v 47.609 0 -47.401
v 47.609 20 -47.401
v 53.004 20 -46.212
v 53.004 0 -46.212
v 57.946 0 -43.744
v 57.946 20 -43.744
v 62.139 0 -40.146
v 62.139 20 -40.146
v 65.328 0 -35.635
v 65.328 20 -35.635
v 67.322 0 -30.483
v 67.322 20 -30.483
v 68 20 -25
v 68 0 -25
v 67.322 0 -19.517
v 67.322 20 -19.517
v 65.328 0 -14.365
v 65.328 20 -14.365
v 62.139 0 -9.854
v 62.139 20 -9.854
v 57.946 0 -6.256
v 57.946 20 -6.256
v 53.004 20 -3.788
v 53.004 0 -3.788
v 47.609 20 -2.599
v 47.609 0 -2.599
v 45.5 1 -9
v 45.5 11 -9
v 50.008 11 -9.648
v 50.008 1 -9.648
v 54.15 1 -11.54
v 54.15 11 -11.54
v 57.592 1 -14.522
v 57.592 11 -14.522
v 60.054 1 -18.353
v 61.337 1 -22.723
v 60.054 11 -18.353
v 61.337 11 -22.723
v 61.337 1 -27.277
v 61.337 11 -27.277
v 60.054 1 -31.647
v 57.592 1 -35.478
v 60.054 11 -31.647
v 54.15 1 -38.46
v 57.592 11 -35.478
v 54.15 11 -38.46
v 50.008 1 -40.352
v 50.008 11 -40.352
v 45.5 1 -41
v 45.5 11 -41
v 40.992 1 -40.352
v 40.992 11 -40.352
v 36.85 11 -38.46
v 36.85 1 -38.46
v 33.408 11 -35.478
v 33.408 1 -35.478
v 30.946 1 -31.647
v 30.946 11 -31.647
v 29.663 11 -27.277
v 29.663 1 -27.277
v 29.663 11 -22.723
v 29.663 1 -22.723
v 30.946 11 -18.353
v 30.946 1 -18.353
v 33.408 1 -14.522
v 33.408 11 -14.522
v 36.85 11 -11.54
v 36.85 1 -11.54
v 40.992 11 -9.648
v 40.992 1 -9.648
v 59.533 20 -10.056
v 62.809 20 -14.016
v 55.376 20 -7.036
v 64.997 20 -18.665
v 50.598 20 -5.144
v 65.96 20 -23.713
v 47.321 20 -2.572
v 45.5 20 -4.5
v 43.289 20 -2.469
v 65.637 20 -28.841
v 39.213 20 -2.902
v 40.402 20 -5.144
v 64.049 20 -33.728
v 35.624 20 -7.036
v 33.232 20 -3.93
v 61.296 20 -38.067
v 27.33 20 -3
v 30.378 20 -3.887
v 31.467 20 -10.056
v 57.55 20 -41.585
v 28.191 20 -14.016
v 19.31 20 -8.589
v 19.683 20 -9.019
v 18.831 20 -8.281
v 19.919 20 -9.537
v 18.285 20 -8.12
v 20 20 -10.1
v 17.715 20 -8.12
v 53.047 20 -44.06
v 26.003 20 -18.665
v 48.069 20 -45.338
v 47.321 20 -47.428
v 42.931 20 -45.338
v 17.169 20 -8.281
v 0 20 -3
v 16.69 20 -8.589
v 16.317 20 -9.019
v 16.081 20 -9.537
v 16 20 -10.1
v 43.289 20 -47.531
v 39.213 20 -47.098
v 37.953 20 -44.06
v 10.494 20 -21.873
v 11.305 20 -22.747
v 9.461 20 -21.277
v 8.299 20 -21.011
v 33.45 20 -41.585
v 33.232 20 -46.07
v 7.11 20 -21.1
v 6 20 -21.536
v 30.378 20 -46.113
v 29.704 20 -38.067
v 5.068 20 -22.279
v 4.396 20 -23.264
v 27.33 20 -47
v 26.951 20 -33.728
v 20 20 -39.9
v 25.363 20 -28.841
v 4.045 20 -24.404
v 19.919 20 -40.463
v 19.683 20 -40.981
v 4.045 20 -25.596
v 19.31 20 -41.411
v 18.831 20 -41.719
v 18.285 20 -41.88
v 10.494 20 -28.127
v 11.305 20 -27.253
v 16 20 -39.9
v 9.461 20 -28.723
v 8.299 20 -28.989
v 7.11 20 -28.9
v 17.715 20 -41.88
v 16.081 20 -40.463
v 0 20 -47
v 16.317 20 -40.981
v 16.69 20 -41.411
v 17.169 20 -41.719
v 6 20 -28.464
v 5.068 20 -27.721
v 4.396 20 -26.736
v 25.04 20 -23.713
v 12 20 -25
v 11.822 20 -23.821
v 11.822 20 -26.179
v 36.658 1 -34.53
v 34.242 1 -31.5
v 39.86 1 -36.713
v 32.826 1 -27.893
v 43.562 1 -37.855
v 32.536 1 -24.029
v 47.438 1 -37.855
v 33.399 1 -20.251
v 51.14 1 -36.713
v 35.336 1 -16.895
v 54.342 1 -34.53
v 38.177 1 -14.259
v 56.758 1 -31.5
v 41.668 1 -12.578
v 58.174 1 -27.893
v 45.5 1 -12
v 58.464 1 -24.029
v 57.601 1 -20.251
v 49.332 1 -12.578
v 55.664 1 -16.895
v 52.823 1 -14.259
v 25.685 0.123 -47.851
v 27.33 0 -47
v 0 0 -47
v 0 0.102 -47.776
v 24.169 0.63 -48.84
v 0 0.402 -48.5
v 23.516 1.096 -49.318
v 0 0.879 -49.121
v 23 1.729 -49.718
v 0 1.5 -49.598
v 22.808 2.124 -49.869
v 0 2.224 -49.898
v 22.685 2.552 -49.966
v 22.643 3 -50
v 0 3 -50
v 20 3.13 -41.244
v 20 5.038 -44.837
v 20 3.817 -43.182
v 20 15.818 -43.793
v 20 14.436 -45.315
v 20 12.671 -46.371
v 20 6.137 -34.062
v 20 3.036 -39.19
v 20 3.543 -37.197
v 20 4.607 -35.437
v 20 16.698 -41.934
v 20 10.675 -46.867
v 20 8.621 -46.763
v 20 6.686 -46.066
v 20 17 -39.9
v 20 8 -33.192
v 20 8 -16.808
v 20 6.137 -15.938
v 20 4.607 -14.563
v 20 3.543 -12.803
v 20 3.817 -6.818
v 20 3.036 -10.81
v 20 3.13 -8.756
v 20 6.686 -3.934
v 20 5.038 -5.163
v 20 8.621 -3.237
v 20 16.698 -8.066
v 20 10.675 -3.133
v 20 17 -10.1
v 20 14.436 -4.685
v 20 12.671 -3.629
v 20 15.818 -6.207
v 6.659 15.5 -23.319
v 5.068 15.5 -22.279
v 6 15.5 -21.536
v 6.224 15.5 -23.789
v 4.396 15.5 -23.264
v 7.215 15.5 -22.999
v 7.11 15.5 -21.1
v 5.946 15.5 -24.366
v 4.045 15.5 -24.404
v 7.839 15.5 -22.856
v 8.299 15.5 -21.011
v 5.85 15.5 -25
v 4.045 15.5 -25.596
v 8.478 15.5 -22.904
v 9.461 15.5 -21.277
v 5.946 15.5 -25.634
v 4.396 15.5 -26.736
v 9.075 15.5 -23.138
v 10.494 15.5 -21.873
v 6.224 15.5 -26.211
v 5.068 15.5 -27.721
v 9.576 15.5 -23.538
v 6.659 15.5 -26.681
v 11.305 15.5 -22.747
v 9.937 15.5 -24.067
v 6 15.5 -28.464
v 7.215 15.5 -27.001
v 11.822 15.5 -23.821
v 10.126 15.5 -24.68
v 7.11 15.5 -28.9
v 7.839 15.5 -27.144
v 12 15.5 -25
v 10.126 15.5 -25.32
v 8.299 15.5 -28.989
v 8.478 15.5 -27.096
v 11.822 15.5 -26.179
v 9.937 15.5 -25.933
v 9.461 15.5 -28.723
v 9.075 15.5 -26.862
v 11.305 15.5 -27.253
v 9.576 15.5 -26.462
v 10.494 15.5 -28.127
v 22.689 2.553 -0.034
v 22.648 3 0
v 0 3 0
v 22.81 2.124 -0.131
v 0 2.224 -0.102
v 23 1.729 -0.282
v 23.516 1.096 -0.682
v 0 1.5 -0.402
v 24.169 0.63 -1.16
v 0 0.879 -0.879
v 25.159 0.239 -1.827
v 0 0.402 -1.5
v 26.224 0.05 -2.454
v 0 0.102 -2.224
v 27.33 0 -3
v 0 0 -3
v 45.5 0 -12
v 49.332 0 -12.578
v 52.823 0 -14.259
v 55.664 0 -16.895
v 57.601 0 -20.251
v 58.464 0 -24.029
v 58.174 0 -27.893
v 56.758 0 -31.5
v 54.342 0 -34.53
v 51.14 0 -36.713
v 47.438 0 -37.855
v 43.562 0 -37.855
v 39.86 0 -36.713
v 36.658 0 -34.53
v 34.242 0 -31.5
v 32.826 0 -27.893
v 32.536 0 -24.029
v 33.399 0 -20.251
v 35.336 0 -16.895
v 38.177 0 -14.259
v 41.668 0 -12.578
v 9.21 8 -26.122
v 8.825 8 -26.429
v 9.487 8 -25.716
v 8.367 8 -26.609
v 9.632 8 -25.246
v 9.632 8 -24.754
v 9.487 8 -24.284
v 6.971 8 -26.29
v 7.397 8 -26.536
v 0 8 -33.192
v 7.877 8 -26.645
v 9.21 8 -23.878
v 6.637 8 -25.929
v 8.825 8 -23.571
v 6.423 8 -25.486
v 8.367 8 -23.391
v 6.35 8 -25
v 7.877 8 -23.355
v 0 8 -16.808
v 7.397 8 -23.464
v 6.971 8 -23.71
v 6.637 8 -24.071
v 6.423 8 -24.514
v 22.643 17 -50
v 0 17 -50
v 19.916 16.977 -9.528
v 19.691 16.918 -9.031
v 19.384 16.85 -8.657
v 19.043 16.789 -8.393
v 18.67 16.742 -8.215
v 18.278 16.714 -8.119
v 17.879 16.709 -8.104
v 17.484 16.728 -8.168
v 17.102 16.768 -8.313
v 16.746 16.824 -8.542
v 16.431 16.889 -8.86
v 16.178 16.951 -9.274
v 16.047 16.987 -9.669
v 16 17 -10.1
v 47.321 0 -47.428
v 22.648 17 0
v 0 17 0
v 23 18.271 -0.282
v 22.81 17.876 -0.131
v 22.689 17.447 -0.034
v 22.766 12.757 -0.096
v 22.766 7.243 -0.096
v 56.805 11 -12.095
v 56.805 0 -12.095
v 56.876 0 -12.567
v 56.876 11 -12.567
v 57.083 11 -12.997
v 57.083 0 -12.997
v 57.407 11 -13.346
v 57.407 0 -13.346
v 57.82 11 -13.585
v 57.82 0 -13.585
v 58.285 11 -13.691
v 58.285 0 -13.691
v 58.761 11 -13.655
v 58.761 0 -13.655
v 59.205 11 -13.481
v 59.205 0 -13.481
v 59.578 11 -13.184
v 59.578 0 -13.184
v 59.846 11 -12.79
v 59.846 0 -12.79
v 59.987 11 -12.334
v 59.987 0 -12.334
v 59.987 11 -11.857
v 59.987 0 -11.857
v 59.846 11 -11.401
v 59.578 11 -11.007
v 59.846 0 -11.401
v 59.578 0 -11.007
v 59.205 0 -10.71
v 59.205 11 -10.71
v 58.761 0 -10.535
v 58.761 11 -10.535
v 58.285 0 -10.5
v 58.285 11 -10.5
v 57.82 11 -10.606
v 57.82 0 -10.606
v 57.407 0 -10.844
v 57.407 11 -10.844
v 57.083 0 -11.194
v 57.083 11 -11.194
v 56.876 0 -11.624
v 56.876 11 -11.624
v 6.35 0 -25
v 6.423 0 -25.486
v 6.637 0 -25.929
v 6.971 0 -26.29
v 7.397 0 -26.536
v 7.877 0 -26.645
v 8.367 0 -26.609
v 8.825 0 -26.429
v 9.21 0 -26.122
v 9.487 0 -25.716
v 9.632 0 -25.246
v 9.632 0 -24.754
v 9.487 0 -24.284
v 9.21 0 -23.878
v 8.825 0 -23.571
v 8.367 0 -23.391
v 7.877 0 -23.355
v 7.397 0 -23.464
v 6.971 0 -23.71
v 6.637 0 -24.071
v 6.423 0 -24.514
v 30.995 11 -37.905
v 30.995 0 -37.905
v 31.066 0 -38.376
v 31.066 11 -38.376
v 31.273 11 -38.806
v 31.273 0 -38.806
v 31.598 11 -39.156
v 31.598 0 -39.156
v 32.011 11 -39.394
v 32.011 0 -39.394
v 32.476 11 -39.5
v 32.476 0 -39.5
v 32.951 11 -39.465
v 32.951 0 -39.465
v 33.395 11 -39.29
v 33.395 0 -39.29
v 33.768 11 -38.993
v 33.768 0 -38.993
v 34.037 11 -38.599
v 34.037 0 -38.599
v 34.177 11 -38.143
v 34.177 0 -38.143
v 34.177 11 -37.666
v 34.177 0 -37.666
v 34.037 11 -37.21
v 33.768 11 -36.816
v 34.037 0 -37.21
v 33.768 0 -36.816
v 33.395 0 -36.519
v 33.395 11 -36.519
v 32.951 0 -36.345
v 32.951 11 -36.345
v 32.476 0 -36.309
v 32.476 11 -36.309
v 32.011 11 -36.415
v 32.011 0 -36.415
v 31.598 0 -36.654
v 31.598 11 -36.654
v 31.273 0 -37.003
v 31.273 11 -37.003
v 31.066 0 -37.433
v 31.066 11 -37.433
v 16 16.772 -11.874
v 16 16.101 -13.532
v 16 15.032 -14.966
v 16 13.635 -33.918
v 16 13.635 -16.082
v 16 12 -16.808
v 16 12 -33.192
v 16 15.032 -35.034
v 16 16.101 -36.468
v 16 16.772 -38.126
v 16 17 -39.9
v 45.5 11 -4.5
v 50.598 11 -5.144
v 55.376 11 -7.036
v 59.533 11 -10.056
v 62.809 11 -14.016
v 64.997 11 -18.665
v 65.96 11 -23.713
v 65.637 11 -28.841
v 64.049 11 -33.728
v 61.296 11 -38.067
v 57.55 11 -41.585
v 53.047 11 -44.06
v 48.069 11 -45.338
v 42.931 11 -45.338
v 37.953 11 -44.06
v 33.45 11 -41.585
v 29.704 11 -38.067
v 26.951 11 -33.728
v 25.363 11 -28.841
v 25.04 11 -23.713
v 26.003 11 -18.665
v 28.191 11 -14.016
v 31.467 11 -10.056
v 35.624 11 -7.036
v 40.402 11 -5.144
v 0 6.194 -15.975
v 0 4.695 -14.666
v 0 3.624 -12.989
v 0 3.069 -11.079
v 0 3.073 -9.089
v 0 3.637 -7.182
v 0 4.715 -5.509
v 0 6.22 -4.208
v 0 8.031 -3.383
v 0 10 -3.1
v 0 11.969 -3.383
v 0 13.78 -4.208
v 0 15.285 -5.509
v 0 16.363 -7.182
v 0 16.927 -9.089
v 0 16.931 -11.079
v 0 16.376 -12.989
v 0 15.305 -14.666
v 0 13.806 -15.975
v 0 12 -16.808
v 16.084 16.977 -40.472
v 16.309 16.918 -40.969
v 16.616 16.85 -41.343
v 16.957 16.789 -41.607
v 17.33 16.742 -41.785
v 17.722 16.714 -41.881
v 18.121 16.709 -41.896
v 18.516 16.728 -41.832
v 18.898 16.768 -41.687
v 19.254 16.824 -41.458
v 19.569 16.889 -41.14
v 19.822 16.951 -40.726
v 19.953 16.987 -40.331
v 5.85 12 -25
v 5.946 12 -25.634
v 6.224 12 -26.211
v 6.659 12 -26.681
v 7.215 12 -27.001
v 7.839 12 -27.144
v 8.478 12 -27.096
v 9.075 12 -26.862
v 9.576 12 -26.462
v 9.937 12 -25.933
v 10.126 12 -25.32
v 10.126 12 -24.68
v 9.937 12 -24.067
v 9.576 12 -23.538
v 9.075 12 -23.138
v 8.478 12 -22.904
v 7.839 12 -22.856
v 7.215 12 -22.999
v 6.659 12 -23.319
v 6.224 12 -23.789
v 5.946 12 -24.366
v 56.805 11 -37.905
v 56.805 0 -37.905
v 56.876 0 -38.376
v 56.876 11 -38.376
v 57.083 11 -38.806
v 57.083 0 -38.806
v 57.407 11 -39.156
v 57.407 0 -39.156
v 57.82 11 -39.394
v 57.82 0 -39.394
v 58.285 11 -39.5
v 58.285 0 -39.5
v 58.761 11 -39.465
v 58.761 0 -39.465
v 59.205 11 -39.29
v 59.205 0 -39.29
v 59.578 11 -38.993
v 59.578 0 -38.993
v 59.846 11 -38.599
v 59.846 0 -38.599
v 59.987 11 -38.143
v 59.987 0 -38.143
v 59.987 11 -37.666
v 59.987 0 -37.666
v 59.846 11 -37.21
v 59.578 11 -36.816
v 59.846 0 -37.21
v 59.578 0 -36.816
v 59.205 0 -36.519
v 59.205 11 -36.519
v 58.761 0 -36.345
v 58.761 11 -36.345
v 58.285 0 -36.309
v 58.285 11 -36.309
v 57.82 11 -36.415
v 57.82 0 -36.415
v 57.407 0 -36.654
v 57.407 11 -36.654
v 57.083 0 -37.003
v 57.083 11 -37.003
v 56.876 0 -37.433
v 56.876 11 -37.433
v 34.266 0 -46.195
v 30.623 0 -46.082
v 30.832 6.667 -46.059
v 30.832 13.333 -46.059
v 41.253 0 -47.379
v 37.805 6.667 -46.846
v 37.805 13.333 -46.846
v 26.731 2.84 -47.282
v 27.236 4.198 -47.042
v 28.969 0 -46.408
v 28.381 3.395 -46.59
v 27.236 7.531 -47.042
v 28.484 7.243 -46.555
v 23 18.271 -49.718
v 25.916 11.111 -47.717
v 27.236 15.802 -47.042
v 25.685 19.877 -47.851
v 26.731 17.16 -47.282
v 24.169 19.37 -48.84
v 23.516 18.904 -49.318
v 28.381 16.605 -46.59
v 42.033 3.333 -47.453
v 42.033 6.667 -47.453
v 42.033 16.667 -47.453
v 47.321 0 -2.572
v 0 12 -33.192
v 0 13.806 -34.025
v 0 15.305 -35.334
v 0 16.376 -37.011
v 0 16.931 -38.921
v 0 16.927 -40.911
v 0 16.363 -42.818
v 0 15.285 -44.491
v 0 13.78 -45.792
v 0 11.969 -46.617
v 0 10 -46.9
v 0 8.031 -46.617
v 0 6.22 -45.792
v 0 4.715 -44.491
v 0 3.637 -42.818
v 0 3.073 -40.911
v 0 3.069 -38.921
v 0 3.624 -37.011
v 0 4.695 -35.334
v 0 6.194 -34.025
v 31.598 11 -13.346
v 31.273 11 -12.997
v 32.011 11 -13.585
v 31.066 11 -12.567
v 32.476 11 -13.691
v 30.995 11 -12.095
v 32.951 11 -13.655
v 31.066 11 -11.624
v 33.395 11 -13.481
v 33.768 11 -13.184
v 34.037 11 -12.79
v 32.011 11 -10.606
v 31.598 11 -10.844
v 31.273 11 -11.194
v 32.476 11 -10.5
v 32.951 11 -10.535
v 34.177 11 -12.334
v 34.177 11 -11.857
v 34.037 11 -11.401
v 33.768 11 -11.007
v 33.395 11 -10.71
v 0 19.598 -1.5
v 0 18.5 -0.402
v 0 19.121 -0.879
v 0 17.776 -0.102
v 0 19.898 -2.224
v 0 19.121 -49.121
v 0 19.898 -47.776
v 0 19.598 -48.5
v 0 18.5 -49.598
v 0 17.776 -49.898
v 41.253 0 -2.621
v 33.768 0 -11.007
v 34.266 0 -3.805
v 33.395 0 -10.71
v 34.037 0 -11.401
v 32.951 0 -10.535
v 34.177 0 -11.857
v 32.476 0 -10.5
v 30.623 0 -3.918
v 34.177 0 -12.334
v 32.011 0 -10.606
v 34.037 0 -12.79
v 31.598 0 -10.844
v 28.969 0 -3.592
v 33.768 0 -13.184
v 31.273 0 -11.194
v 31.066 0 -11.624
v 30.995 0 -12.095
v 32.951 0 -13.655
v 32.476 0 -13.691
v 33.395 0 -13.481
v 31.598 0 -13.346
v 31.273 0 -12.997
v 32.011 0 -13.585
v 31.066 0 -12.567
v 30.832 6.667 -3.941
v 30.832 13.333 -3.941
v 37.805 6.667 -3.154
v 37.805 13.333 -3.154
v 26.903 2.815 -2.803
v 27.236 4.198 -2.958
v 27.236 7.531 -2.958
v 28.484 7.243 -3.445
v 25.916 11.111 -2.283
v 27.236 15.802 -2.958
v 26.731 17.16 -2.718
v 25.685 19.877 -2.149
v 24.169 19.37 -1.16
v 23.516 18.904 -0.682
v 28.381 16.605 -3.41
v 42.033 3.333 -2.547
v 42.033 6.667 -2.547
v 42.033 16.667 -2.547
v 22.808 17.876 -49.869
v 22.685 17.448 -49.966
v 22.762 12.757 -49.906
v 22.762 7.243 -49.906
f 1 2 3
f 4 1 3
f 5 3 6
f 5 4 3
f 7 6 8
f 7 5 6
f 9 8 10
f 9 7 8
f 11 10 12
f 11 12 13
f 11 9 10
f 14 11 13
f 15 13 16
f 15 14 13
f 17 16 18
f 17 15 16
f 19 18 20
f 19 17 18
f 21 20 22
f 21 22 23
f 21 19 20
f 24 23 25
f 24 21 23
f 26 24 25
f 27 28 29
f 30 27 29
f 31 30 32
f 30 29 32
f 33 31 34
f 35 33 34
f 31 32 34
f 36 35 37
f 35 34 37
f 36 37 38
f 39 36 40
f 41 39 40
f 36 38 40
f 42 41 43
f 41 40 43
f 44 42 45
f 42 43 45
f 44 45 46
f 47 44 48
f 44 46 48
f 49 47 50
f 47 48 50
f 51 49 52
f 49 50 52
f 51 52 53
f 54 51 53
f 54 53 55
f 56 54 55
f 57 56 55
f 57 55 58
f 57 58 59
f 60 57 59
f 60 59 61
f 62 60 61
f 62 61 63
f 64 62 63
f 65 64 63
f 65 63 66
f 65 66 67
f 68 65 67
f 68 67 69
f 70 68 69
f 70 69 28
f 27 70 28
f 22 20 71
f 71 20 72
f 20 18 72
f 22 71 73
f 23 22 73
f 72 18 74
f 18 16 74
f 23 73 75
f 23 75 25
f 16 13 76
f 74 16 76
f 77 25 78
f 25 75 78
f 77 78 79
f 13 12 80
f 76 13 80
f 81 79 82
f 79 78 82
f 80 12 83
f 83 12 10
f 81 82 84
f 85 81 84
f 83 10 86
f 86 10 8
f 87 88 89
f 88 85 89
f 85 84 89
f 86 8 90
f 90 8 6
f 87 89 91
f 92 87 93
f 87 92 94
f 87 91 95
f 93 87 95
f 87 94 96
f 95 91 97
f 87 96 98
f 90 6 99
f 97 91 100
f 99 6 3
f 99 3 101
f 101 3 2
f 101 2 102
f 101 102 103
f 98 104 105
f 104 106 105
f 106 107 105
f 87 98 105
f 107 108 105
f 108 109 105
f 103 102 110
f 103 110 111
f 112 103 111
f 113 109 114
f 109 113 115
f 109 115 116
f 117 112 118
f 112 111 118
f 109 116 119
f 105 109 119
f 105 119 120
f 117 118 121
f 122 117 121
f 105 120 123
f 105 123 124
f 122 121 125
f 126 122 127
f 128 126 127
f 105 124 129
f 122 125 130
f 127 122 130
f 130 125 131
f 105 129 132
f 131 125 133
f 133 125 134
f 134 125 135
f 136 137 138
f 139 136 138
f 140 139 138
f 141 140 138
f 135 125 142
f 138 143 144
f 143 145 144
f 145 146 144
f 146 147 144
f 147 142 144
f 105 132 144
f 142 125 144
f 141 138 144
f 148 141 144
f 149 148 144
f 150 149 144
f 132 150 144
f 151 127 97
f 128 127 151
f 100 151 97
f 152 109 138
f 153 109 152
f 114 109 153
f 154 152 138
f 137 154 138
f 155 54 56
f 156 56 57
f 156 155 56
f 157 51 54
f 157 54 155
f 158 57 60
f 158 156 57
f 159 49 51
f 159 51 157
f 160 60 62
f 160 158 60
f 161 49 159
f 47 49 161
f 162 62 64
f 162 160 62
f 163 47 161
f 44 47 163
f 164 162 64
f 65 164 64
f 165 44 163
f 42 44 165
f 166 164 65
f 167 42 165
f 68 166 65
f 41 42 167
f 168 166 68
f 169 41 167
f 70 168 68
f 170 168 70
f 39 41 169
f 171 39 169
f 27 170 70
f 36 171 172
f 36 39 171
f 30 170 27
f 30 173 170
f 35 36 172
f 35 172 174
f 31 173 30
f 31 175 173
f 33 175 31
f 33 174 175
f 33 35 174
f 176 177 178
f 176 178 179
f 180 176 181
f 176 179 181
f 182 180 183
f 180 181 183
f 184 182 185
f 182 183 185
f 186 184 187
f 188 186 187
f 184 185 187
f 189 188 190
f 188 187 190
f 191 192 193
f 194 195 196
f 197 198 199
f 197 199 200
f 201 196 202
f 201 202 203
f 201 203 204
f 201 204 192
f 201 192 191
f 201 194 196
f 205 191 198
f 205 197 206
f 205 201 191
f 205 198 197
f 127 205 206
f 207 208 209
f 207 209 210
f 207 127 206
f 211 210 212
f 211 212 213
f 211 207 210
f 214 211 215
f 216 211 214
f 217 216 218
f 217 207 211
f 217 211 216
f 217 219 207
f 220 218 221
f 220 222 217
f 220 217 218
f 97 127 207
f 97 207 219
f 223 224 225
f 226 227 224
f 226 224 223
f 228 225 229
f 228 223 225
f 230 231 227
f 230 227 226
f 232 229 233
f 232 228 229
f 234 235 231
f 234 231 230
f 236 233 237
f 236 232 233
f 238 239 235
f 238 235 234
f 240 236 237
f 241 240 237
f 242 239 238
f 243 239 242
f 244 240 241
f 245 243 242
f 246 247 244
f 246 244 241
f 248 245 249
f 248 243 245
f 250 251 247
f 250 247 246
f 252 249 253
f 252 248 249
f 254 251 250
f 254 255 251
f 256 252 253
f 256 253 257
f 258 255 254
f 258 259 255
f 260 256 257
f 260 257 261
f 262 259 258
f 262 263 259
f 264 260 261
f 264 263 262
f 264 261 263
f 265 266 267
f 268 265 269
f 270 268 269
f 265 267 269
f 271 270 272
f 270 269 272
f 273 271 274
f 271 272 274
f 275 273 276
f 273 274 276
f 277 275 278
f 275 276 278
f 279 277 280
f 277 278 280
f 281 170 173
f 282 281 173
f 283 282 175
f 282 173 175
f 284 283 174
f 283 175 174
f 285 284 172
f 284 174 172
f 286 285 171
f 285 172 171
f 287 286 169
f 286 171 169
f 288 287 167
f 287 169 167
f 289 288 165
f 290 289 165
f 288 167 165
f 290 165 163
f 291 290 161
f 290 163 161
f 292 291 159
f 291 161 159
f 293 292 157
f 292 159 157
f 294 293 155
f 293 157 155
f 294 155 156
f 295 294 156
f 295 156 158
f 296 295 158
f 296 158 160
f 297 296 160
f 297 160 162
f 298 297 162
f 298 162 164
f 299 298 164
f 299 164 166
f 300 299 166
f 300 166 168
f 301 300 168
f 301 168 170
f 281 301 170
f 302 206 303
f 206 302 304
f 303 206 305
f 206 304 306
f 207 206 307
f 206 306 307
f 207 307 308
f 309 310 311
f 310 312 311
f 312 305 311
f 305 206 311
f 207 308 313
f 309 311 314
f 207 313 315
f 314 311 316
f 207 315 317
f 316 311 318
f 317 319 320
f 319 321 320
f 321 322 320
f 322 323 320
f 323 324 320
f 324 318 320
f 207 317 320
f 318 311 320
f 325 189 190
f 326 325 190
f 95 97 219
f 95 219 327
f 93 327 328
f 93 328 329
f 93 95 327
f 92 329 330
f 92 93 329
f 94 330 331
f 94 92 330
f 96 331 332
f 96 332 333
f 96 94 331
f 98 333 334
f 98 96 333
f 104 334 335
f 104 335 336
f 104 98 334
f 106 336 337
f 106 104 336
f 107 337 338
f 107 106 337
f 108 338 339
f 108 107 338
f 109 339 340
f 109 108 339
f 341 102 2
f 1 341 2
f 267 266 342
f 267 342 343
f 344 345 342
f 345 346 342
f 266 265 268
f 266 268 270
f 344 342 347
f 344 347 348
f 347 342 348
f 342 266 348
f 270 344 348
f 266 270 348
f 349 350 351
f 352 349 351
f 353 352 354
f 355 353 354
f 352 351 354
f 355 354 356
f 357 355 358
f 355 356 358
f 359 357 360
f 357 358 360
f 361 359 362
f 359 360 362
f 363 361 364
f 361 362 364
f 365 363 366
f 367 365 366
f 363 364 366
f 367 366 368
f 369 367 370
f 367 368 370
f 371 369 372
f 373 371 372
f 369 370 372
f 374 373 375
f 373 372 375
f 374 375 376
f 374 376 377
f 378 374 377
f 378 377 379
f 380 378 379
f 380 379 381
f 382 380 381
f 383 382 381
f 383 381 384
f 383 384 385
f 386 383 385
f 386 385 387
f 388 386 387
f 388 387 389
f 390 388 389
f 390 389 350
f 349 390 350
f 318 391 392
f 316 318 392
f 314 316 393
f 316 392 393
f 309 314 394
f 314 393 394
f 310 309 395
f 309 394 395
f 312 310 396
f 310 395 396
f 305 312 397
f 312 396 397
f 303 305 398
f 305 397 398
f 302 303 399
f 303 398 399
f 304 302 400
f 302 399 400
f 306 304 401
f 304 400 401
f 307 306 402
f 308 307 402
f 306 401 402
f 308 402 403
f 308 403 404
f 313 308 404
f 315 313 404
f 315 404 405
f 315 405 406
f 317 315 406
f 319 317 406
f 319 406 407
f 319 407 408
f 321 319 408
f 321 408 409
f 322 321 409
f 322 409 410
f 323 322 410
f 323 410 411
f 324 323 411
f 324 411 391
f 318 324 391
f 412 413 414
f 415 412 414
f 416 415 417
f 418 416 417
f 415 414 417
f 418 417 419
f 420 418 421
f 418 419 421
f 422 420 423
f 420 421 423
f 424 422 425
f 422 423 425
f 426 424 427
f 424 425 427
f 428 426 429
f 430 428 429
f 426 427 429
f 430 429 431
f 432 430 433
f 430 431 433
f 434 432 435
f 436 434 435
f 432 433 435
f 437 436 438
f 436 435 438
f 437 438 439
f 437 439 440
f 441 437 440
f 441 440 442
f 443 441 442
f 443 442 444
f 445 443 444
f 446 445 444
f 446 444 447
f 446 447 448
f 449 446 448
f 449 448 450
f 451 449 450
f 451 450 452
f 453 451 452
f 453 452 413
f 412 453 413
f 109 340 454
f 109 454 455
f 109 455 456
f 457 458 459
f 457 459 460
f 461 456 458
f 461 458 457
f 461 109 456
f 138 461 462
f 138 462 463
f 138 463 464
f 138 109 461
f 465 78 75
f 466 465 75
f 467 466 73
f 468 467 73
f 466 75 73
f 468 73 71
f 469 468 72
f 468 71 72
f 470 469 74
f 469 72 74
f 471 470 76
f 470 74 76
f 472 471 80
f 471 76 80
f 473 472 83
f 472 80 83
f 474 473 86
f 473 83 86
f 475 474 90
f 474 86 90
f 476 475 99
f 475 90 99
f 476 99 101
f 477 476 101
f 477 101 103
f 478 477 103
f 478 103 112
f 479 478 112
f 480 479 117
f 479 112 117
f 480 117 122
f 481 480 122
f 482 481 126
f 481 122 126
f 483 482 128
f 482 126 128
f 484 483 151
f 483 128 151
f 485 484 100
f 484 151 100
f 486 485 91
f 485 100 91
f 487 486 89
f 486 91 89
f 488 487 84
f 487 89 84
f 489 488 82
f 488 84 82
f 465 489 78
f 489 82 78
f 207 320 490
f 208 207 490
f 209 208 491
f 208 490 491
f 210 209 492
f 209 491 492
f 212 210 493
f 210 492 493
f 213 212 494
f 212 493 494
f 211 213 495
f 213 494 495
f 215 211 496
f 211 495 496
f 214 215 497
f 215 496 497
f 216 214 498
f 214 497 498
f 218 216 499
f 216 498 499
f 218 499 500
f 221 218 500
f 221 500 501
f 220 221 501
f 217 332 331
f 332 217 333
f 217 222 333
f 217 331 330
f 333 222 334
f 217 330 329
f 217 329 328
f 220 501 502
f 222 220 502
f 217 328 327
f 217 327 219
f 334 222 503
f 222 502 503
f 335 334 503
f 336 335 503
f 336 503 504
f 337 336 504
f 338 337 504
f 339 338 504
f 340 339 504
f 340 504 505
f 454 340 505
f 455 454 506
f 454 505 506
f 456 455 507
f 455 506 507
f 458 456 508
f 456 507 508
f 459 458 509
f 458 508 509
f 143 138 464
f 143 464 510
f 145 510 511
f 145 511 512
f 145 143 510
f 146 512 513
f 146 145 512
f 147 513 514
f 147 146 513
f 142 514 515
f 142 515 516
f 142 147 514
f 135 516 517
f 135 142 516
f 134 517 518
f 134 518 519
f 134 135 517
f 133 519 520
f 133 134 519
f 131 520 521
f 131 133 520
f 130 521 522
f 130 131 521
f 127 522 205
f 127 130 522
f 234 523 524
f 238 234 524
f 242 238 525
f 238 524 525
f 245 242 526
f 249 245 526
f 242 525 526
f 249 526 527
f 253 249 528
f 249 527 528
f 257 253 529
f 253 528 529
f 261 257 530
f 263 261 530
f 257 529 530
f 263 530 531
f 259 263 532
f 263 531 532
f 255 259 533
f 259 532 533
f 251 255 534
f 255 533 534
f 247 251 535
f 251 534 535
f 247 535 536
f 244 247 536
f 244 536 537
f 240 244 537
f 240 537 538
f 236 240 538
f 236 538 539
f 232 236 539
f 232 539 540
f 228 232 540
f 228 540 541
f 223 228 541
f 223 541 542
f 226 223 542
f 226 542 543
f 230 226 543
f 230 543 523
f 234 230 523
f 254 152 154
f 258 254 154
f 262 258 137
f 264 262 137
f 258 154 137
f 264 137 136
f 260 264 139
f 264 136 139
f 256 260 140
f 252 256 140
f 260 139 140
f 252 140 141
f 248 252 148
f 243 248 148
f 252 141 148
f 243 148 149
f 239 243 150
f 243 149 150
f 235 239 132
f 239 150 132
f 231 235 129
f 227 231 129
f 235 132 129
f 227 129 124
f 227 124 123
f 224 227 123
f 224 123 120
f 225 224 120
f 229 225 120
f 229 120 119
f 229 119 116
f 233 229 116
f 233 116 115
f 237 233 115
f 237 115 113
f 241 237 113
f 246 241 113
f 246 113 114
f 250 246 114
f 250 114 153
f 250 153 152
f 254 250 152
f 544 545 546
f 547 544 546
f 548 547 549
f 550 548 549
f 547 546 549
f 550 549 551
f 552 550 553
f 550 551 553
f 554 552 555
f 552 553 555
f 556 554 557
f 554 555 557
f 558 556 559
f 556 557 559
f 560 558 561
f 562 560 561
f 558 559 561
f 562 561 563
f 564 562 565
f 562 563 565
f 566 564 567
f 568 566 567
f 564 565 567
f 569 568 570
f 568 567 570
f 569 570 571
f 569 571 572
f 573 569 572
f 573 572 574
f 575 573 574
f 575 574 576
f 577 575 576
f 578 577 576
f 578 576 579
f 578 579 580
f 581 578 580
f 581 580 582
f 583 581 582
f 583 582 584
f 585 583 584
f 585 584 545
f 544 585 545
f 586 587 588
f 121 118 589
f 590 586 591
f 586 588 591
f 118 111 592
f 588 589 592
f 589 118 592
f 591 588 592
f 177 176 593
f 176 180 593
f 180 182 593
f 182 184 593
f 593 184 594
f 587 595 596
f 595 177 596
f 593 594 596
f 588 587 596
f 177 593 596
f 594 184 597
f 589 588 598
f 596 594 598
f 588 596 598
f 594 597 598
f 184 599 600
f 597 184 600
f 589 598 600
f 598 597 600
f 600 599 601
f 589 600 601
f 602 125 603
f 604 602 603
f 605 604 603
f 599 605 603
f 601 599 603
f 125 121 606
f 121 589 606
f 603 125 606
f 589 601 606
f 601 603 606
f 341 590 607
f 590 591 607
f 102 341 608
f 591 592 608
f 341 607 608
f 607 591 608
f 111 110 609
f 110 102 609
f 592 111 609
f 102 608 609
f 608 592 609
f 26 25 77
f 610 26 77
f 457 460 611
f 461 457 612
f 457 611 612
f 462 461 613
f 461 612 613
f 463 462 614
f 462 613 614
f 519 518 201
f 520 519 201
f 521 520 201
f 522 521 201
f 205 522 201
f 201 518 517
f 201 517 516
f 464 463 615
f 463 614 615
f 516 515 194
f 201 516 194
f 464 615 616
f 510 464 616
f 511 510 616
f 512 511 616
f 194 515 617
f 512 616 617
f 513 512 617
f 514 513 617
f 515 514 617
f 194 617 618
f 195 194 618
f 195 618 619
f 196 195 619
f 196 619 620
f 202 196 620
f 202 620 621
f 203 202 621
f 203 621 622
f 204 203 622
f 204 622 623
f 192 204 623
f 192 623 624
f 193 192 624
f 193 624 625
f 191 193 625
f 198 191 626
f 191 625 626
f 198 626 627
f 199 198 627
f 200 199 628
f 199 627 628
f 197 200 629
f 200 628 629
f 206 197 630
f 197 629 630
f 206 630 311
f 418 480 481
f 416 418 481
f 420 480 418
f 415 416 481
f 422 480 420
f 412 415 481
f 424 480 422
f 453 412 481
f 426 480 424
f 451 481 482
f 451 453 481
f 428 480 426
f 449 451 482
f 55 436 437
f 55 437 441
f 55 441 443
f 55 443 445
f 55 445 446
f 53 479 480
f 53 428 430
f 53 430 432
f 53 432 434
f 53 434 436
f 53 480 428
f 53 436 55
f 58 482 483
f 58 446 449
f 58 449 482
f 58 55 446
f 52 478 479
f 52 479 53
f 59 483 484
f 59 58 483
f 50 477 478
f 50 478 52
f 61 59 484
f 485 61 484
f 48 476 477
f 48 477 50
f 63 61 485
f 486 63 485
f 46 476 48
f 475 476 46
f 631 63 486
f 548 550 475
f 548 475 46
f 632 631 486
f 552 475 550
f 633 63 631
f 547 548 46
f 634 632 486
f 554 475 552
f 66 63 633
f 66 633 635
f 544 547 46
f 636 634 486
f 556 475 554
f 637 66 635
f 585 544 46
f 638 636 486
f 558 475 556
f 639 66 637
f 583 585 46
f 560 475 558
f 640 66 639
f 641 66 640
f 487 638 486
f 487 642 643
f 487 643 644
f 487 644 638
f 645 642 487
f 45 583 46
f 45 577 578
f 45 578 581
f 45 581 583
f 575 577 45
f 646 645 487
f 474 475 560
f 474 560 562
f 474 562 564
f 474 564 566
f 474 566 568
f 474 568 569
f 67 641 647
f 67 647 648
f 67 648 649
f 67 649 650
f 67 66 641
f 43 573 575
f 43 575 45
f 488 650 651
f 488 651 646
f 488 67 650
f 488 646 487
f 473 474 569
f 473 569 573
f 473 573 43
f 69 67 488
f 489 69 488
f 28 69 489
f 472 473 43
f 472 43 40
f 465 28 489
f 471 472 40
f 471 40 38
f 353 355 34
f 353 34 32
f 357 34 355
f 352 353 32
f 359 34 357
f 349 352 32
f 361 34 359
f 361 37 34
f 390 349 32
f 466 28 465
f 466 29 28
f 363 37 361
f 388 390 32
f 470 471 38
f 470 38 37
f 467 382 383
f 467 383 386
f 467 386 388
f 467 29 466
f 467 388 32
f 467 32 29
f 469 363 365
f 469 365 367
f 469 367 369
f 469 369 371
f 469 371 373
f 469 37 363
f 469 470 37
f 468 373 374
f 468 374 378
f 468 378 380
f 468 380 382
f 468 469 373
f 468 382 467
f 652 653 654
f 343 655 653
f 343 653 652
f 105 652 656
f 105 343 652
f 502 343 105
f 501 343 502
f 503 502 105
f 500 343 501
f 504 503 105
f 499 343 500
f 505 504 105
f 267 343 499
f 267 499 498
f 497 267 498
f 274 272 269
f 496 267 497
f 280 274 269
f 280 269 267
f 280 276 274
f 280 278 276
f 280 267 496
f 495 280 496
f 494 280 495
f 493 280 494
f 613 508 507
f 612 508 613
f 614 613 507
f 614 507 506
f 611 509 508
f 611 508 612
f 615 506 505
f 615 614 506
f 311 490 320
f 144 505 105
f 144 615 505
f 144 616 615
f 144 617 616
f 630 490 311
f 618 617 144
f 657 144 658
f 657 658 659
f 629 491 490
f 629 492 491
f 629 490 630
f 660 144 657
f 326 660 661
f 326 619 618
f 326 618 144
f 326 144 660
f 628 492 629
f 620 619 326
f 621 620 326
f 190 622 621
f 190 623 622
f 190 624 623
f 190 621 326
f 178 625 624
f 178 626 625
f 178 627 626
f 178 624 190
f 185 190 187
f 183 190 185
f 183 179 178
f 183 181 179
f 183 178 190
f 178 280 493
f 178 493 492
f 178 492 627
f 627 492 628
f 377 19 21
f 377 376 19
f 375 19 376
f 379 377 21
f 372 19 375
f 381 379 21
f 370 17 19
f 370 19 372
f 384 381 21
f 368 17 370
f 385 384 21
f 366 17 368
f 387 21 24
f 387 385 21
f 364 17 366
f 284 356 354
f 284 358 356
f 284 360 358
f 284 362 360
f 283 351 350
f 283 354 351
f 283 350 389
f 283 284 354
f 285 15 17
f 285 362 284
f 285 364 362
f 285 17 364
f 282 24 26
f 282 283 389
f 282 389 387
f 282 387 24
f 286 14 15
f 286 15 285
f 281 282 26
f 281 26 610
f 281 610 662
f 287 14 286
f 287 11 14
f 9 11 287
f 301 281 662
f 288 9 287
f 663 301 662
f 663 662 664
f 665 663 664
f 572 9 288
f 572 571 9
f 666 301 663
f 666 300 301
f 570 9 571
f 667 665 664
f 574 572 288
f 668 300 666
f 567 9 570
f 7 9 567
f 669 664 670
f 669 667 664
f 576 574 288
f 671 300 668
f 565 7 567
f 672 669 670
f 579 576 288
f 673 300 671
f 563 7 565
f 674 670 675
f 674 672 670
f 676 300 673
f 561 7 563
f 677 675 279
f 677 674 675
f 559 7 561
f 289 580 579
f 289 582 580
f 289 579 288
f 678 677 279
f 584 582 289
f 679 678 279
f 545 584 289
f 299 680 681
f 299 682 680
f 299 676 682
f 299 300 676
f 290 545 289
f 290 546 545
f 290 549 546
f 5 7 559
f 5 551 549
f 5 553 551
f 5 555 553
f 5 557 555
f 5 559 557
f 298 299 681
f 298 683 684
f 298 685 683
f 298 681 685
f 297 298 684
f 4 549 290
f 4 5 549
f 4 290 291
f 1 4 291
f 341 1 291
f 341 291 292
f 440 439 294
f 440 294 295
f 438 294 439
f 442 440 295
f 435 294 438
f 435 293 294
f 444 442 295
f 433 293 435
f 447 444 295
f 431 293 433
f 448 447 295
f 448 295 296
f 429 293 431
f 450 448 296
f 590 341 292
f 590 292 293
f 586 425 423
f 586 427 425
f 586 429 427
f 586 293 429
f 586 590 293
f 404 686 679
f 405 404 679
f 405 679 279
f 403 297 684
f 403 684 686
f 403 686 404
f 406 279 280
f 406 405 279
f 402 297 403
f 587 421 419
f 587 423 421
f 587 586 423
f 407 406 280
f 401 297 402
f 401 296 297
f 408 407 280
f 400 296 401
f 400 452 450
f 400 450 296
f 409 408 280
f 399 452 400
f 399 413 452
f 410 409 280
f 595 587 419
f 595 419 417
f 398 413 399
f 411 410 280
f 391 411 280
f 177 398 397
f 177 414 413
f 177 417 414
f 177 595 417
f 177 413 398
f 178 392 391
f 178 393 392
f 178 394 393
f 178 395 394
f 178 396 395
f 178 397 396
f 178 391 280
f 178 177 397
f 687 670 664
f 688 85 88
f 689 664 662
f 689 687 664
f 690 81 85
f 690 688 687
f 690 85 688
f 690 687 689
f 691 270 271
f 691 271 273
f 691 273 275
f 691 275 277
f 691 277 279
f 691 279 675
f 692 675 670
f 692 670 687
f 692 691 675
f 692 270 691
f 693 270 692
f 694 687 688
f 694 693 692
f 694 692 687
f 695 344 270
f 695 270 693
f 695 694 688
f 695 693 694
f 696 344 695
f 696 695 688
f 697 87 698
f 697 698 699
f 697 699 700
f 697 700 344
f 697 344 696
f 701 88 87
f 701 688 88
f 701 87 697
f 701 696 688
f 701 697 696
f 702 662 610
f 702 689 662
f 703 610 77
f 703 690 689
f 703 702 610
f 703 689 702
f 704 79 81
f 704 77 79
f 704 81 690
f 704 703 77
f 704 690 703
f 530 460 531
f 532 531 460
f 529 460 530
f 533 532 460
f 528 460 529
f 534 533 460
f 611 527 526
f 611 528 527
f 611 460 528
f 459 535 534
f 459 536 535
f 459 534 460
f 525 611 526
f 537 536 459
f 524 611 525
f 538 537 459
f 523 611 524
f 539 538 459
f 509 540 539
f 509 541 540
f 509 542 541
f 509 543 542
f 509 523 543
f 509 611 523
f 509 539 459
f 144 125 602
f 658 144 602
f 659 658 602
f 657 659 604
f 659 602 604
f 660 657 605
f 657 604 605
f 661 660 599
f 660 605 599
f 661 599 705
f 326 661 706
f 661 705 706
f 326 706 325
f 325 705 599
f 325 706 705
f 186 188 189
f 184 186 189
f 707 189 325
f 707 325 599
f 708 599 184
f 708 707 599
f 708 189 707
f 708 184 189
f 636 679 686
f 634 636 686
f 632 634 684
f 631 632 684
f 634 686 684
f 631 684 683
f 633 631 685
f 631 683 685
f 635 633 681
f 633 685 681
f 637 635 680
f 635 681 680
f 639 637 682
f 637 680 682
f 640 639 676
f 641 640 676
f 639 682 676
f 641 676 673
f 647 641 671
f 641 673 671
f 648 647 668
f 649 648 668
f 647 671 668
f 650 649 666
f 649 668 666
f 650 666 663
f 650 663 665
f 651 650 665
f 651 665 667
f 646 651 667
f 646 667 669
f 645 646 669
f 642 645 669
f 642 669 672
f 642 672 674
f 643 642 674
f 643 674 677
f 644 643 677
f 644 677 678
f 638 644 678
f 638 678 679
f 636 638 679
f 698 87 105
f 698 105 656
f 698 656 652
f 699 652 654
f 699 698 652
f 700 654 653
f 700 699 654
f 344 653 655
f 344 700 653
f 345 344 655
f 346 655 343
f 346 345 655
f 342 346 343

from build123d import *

# Parameters (mm, degrees)
EXTRUDE_1_DEPTH             = 20
SKETCH_2_R                  = 7
CUT_EXTRUDE_1_DEPTH         = 20
SKETCH_3_R                  = 13
CUT_EXTRUDE_2_DEPTH         = 87.740993769
SKETCH_4_R                  = 16
CUT_EXTRUDE_3_DEPTH         = 19
CUT_EXTRUDE_9_DEPTH         = 87.740993769
EXTRUDE_START               = -20
EXTRUDE_4_DEPTH             = 20
FILLET_2_R                  = 3
SKETCH_7_R                  = 20.5
CUT_EXTRUDE_10_DEPTH        = 9
SKETCH_8_W                  = 29.8
SKETCH_8_H                  = 4
CUT_EXTRUDE_11_DEPTH        = 20
CUT_EXTRUDE_12_DEPTH        = 10
HOLE_WIZARD_M41_D           = 4.3
HOLE_WIZARD_M41_DEPTH       = 8
HOLE_WIZARD_M41_CBORE_D     = 8
HOLE_WIZARD_M41_CBORE_DEPTH = 4.5
M4X0_71_D                   = 3.3
HOLE_WIZARD_M31_D           = 3.2


# Read off the part's stored shape, not the designer's step: Бобышка-Вытянуть4
with BuildPart() as part:
    # Эскиз1 → Бобышка-Вытянуть1 (new body)
    with BuildSketch(Plane(origin=(0, 0, 0), x_dir=(1, 0, 0), z_dir=(0, 1, 0))):
        with BuildLine():
            Line((0, 0), (0, 50))
            Line((0, 50), (20, 50))
            Line((20, 50), (47.60878471, 47.400960405))
            ThreePointArc((47.60878471, 47.400960405), (68, 25), (47.60878471, 2.599039595))
            Line((47.60878471, 2.599039595), (20, 0))
            Line((20, 0), (0, 0))
        make_face()
    extrude(amount=EXTRUDE_1_DEPTH)

    # Эскиз2 → Вырез-Вытянуть1 (cut)
    with BuildSketch(Plane.ZY):
        with Locations((-39.9, 10)):
            Circle(SKETCH_2_R)
        with Locations(Location((-10.1, 10, 0), (0, 0, 180))):
            Circle(SKETCH_2_R)
    extrude(amount=-CUT_EXTRUDE_1_DEPTH, mode=Mode.SUBTRACT)

    # Эскиз3 → Вырез-Вытянуть2 (cut, through all)
    with BuildSketch(Plane(origin=(0, 20, 0), x_dir=(1, 0, 0), z_dir=(0, 1, 0))):
        with Locations(Location((45.5, 25, 0), (0, 0, 270))):
            Circle(SKETCH_3_R)
    extrude(amount=-CUT_EXTRUDE_2_DEPTH, mode=Mode.SUBTRACT)

    # Эскиз4 → Вырез-Вытянуть3 (cut)
    with BuildSketch(Plane(origin=(0, 20, 0), x_dir=(1, 0, 0), z_dir=(0, 1, 0))):
        with Locations(Location((45.5, 25, 0), (0, 0, 270))):
            Circle(SKETCH_4_R)
    extrude(amount=-CUT_EXTRUDE_3_DEPTH, mode=Mode.SUBTRACT)

    # Эскиз5 → Вырез-Вытянуть9 (cut, through all)
    with BuildSketch(Plane(origin=(0, 20, 0), x_dir=(1, 0, 0), z_dir=(0, 1, 0))):
        with BuildLine():
            add(Edge.make_bspline(
                [(47.32108314, 47.428044097), (47.41641101, 47.41948544), (47.512308925, 47.410461109), (47.60878471, 47.400960405)],
                knots=[0.992066387, 0.992066387, 0.992066387, 0.992066387, 1, 1, 1, 1], degree=3))
            Line((47.32108314, 47.428044095), (47.60878471, 47.400960405))
        make_face()
        with BuildLine():
            Line((47.32108314, 47.428044097), (23, 49.717585585))
            add(Edge.make_bspline(
                [(23, 49.717585585), (32.393861284, 42.286998451), (35.400716473, 48.498269788), (47.32108314, 47.428044097)],
                knots=[0, 0, 0, 0, 0.992066387, 0.992066387, 0.992066387, 0.992066387], degree=3))
        make_face()
        with BuildLine():
            add(Edge.make_bspline(
                [(23, 0.282414415), (32.393861284, 7.713001549), (35.400716473, 1.501730212), (47.32108314, 2.571955903)],
                knots=[0, 0, 0, 0, 0.992066387, 0.992066387, 0.992066387, 0.992066387], degree=3))
            Line((23, 0.282414415), (47.32108314, 2.571955903))
        make_face()
        with BuildLine():
            Line((47.60878471, 2.599039595), (47.32108314, 2.571955905))
            add(Edge.make_bspline(
                [(47.32108314, 2.571955903), (47.41641101, 2.58051456), (47.512308925, 2.589538891), (47.60878471, 2.599039595)],
                knots=[0.992066387, 0.992066387, 0.992066387, 0.992066387, 1, 1, 1, 1], degree=3))
        make_face()
    extrude(amount=-CUT_EXTRUDE_9_DEPTH, mode=Mode.SUBTRACT)

    # Бобышка-Вытянуть4 outline → Бобышка-Вытянуть4 (add)
    with BuildSketch(Plane(origin=(0, 20, 0), x_dir=(1, 0, 0), z_dir=(0, 1, 0)).offset(EXTRUDE_START)):
        with BuildLine():
            add(Edge.make_bspline(
                [(22.6429674, 50), (22.761978267, 49.905861862), (22.880989133, 49.811723723), (23, 49.717585585)],
                knots=[-0.012568493, -0.012568493, -0.012568493, -0.012568493, 0, 0, 0, 0], degree=3))
            Line((22.6429674, 50), (20, 50))
            Line((20, 50), (23, 49.717585585))
        make_face()
        with BuildLine():
            Line((20, 0), (22.6479861, 0))
            add(Edge.make_bspline(
                [(22.6479861, 0), (22.766323231, 0.09625734), (22.883651508, 0.190382227), (23, 0.282414415)],
                knots=[-0.012287325, -0.012287325, -0.012287325, -0.012287325, 0, 0, 0, 0], degree=3))
            Line((23, 0.282414415), (20, 0))
        make_face()
    extrude(amount=EXTRUDE_4_DEPTH)

    # Скругление2
    fillet_2_edges = [part.edges().sort_by_distance(p)[0] for p in [
        (11.32399305, 0, 0),
        (11.32399305, 20, 0),
        (11.3214837, 0, -50),
        (11.3214837, 20, -50),
    ]]
    fillet(fillet_2_edges, radius=FILLET_2_R)

    # Эскиз7 → Вырез-Вытянуть10 (cut)
    with BuildSketch(Plane(origin=(0, 20, 0), x_dir=(1, 0, 0), z_dir=(0, 1, 0))):
        with Locations(Location((45.5, 25, 0), (0, 0, 270))):
            Circle(SKETCH_7_R)
    extrude(amount=-CUT_EXTRUDE_10_DEPTH, mode=Mode.SUBTRACT)

    # Эскиз8 → Вырез-Вытянуть11 (cut)
    with BuildSketch(Plane.ZY):
        with Locations((-25, 10)):
            Rectangle(SKETCH_8_W, SKETCH_8_H)
    extrude(amount=-CUT_EXTRUDE_11_DEPTH, mode=Mode.SUBTRACT)

    # Эскиз9 → Вырез-Вытянуть12 (cut)
    with BuildSketch(Plane(origin=(0, 20, 0), x_dir=(1, 0, 0), z_dir=(0, 1, 0))):
        with BuildLine():
            Line((20, 39.9), (20, 10.1))
            ThreePointArc((20, 10.1), (18, 8.1), (16, 10.1))
            Line((16, 10.1), (16, 39.9))
            ThreePointArc((16, 39.9), (18, 41.9), (20, 39.9))
        make_face()
    extrude(amount=-CUT_EXTRUDE_12_DEPTH, mode=Mode.SUBTRACT)

    # Цековка для винта с внутренним шестигранником M41
    with Locations(Plane(origin=(0, 20, 0), x_dir=(1, 0, 0), z_dir=(0, 1, 0))):
        with Locations((8, 25)):
            CounterBoreHole(HOLE_WIZARD_M41_D / 2, HOLE_WIZARD_M41_CBORE_D / 2, HOLE_WIZARD_M41_CBORE_DEPTH, depth=HOLE_WIZARD_M41_DEPTH)

    # Отверстие обработанное метчиком M4x0.71 (through all)
    with Locations(Plane(origin=(0, 8, 0), x_dir=(1, 0, 0), z_dir=(0, 1, 0))):
        with Locations((8, 25)):
            Hole(M4X0_71_D / 2)

    # Отверстие с зазором M31 (through all)
    with Locations(Plane(origin=(0, 11, 0), x_dir=(1, 0, 0), z_dir=(0, 1, 0))):
        with Locations((32.595301243, 37.904698757), (58.404698757, 37.904698757), (58.404698757, 12.095301243), (32.595301243, 12.095301243)):
            Hole(HOLE_WIZARD_M31_D / 2)


solid = part.part
